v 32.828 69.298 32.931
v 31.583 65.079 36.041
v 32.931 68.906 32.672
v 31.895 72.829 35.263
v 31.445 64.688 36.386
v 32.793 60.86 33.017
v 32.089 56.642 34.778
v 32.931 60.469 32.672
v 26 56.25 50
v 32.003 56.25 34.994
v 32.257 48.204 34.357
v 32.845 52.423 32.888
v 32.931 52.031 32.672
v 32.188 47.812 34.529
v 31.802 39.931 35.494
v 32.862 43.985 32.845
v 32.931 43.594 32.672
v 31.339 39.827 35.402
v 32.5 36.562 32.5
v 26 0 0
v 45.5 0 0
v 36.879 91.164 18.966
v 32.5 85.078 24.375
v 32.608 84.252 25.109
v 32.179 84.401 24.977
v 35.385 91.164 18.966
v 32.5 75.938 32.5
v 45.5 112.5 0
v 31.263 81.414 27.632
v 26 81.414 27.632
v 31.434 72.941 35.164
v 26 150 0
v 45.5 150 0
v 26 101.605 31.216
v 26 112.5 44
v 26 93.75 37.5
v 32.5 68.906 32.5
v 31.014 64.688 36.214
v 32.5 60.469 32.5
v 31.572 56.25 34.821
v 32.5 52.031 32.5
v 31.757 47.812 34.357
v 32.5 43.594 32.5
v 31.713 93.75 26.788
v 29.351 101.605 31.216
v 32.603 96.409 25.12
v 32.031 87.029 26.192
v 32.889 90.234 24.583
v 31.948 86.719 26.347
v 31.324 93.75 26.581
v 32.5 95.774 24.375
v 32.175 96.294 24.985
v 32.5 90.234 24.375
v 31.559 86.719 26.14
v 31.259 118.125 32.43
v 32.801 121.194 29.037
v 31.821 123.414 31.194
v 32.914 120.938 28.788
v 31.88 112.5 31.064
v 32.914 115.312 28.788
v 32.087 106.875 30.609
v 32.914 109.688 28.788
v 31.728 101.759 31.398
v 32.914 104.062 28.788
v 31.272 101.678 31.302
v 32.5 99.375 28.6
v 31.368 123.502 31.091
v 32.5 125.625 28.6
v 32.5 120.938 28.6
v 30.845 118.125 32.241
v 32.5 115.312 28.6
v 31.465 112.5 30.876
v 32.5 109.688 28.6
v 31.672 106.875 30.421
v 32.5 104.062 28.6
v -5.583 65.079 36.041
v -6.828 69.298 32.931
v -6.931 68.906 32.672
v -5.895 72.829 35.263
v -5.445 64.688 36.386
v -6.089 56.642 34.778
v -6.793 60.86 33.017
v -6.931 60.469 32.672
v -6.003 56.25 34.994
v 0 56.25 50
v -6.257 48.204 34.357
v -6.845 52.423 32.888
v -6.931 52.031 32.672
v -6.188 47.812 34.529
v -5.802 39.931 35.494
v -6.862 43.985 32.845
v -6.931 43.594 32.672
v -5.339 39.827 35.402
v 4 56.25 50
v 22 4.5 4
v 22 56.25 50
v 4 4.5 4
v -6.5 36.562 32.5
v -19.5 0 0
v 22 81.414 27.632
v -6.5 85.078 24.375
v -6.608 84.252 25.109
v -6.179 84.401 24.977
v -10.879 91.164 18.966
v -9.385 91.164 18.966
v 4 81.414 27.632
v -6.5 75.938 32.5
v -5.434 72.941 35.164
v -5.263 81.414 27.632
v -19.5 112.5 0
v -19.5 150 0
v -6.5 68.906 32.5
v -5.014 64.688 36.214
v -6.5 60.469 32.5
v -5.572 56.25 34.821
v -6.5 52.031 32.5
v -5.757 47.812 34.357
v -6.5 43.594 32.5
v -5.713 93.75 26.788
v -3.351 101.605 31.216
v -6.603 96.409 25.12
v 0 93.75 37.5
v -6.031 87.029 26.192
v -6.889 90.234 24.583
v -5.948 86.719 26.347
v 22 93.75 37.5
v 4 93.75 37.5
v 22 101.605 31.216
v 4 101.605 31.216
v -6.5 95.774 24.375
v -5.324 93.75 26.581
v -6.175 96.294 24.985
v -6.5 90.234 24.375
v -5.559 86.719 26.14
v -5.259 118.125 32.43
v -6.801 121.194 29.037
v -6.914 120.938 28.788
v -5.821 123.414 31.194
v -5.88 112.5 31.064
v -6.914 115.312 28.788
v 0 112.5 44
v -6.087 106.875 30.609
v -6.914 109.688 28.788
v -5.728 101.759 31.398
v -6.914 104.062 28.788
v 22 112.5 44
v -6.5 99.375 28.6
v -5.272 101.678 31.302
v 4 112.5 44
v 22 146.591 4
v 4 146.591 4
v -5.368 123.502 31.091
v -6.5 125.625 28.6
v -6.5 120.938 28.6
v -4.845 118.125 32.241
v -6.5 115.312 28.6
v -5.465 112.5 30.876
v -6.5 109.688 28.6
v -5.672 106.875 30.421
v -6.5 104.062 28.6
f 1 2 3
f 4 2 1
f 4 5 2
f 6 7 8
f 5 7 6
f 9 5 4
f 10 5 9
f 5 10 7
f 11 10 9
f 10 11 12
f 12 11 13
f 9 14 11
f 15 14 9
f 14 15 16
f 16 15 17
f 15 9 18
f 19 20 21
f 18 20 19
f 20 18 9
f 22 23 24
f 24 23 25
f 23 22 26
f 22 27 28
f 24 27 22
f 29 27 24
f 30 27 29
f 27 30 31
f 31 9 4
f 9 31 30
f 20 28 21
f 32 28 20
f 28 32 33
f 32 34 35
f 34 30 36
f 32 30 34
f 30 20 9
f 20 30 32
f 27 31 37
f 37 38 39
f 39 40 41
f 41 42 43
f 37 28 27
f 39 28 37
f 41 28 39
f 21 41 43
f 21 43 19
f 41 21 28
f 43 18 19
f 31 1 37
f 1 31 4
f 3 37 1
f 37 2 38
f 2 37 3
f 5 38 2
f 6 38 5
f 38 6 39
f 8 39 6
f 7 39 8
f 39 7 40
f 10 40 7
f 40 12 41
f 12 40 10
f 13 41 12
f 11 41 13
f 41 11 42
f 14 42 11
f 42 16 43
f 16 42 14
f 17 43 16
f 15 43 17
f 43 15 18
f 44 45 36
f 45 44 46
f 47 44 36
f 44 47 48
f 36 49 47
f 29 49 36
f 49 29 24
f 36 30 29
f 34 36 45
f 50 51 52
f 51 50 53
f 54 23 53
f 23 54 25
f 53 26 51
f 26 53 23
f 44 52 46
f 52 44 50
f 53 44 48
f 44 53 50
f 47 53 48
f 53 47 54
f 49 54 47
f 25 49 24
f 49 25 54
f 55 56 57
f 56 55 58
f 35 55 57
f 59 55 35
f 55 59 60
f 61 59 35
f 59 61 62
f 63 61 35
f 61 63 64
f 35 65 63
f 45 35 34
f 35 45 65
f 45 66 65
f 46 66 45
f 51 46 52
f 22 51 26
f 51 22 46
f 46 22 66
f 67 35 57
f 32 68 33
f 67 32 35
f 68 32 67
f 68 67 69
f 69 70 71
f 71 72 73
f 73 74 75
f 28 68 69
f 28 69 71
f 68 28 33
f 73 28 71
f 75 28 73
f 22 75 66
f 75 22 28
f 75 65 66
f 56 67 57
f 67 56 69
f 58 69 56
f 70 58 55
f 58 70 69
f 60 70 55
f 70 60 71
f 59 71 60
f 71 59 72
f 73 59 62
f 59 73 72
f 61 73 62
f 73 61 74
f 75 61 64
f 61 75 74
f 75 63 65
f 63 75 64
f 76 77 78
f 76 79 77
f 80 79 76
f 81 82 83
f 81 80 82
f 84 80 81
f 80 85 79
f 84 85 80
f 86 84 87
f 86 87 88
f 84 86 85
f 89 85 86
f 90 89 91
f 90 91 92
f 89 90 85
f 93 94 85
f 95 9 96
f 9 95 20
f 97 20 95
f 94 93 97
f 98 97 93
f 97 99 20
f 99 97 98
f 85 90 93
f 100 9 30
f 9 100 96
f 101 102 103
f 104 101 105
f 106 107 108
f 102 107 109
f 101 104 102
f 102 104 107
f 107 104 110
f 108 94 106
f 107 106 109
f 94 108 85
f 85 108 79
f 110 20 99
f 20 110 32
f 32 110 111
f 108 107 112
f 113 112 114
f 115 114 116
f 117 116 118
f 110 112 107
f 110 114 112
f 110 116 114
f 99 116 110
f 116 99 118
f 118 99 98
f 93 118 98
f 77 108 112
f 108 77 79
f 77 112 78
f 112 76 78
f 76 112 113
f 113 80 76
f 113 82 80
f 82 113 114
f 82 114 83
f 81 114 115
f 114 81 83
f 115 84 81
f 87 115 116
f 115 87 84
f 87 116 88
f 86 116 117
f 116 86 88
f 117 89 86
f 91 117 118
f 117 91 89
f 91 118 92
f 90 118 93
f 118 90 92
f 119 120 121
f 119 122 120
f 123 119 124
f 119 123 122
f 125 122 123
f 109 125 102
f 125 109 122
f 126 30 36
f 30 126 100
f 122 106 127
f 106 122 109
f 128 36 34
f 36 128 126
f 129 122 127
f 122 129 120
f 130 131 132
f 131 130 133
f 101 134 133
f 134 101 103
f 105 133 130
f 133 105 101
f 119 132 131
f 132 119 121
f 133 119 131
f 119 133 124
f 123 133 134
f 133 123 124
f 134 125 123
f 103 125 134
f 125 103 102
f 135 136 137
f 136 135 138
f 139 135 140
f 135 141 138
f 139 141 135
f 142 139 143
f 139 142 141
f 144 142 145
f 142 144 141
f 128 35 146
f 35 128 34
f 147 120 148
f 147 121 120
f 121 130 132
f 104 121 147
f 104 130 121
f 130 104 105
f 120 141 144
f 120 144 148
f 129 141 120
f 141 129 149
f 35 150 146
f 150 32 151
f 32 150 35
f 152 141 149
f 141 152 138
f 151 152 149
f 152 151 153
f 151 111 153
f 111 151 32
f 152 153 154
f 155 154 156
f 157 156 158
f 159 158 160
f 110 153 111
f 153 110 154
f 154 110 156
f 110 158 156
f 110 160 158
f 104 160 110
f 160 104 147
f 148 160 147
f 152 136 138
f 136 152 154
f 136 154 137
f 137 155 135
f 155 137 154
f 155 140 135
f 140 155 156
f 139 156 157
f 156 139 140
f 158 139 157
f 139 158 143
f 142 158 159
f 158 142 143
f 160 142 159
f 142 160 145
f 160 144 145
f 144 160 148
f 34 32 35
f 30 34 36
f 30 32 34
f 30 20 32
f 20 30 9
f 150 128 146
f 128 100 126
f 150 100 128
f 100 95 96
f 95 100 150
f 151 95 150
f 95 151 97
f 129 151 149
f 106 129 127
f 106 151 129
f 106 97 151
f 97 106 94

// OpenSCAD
/* [Settings] */
// Height of closed laptop
laptop_h = 18;
// Maximum height of mountains
mountain_h = 50;
// Height of base between mountains
base_h = 4;
// Thickness of mountains at tips
mountain_d = 4;

/* [Hidden] */
$fa = 1;   // default minimum facet angle is now 1 mm
$fs = 0.5; // default minimum facet size is now 0.5 mm

module pyramid(w, d, h) {
  polyhedron(
    // the four points at base
    points=[ [d,w,0],[d,-w,0],[0,-w,0],[0,w,0],
    // the apex point
       [0,0,h]  ],
    // each triangle side   
    faces=[ [0,1,4],[1,2,4],[2,3,4],[3,0,4], 
    // two triangles for square base
    [1,0,3],[2,1,3] ],
    convexity = 10
  );
}
 
module mountain(w, d, h, slope_sides=true, use_snow=true) {  
  if (slope_sides) {
    difference() {
      pyramid(w, d, h);
      if (use_snow) {
        stretch = 15;
        h1 = h * 0.65;
        h2 = h - h1;
        d2 = h2 * d / h;
        translate([d2 - 0.5, -w*stretch/40, h1]) {
          resize([0, w*stretch, 0]) {
            rotate([0,-atan(d/h),0]) {
              snowcap();
            }
          }
        }
      }
    }
  } else {
    translate([0, -w, 0]) {
      polyhedron(
        points=[[0,0,0], [d,0,0], [d,2*w,0], [0,2*w,0],
                [0,w,h], [d,w,h]],
        faces=[[0,1,2,3],[5,4,3,2],[0,4,5,1],[0,3,4],[5,2,1]],
        convexity = 10
      );
    }
  }
}

module mtn_range(max_mtn_h, slope_sides=true) {
  mtn_w = max_mtn_h * 0.75;
  mtn_d = max_mtn_h * 0.4;
  
  tall_mtn_w  = mtn_w * 1.5;
  med_mtn_w   = mtn_w;
  short_mtn_w = mtn_w * 1.25;

  tall_mtn_d  = mtn_d;
  med_mtn_d   = mtn_d;
  short_mtn_d = mtn_d;

  tall_mtn_h  = max_mtn_h;
  med_mtn_h   = max_mtn_h * 0.88;
  short_mtn_h = max_mtn_h * 0.75;
  
  translate([0, tall_mtn_w, 0]) {
    mountain(tall_mtn_w, tall_mtn_d, tall_mtn_h, slope_sides);
    translate([0, max_mtn_h * 0.75, 0]) {
      mountain(short_mtn_w, short_mtn_d, short_mtn_h, slope_sides);
    }
    translate([0, max_mtn_h * 1.125, 0]) {
      mountain(med_mtn_w, med_mtn_d, med_mtn_h, slope_sides);
    }
  }
}

module snow_bottom() {
  polygon(points=[
    [0,0], [4,0],
    [1,1],   [4,2],
    [2.5,3], [4,4],
    [2,5],   [4,6],
    [0.5,7], [4,8],
    [1.5,9], [4,10],
    [0,10]]
  );
}

module snowline() {
  translate([0, 0, 4.5]) {
    rotate([0, 90, 0]) {
      linear_extrude(height=5) {
        difference() {
          translate([0.5, 0, 0]) {
            snow_bottom();
          }
          snow_bottom();
        }
      }
    }
  }
}

module snow_top() {
  polygon(points=[
    [100,-100], [4, -100], [4,0],
    [0.5,1], [4,2],
    [2,3],   [4,4],
    [1.5,5], [4,6],
    [0,7],   [4,8],
    [1,9],   [4,10],
    [4, 100], [100,100]]
  );
}

module snowcap() {
  translate([0, 0, 4]) {
    rotate([0, 90, 0]) {
      linear_extrude(height=5) {
        snow_top();
      }
    }
  }
}

difference() {
  union() {
    translate([laptop_h + (2 * mountain_d), 0, 0]) {
      mtn_range(mountain_h);
    }
    mirror([1, 0, 0]) {
      mtn_range(mountain_h);
    }
    resize([laptop_h + (2 * mountain_d), 0, 0]) {
      mtn_range(mountain_h, false);
    }
  }
  translate([mountain_d, 0, base_h]) {
    cube(size=[laptop_h, mountain_h*3, mountain_h]);
  }
}
